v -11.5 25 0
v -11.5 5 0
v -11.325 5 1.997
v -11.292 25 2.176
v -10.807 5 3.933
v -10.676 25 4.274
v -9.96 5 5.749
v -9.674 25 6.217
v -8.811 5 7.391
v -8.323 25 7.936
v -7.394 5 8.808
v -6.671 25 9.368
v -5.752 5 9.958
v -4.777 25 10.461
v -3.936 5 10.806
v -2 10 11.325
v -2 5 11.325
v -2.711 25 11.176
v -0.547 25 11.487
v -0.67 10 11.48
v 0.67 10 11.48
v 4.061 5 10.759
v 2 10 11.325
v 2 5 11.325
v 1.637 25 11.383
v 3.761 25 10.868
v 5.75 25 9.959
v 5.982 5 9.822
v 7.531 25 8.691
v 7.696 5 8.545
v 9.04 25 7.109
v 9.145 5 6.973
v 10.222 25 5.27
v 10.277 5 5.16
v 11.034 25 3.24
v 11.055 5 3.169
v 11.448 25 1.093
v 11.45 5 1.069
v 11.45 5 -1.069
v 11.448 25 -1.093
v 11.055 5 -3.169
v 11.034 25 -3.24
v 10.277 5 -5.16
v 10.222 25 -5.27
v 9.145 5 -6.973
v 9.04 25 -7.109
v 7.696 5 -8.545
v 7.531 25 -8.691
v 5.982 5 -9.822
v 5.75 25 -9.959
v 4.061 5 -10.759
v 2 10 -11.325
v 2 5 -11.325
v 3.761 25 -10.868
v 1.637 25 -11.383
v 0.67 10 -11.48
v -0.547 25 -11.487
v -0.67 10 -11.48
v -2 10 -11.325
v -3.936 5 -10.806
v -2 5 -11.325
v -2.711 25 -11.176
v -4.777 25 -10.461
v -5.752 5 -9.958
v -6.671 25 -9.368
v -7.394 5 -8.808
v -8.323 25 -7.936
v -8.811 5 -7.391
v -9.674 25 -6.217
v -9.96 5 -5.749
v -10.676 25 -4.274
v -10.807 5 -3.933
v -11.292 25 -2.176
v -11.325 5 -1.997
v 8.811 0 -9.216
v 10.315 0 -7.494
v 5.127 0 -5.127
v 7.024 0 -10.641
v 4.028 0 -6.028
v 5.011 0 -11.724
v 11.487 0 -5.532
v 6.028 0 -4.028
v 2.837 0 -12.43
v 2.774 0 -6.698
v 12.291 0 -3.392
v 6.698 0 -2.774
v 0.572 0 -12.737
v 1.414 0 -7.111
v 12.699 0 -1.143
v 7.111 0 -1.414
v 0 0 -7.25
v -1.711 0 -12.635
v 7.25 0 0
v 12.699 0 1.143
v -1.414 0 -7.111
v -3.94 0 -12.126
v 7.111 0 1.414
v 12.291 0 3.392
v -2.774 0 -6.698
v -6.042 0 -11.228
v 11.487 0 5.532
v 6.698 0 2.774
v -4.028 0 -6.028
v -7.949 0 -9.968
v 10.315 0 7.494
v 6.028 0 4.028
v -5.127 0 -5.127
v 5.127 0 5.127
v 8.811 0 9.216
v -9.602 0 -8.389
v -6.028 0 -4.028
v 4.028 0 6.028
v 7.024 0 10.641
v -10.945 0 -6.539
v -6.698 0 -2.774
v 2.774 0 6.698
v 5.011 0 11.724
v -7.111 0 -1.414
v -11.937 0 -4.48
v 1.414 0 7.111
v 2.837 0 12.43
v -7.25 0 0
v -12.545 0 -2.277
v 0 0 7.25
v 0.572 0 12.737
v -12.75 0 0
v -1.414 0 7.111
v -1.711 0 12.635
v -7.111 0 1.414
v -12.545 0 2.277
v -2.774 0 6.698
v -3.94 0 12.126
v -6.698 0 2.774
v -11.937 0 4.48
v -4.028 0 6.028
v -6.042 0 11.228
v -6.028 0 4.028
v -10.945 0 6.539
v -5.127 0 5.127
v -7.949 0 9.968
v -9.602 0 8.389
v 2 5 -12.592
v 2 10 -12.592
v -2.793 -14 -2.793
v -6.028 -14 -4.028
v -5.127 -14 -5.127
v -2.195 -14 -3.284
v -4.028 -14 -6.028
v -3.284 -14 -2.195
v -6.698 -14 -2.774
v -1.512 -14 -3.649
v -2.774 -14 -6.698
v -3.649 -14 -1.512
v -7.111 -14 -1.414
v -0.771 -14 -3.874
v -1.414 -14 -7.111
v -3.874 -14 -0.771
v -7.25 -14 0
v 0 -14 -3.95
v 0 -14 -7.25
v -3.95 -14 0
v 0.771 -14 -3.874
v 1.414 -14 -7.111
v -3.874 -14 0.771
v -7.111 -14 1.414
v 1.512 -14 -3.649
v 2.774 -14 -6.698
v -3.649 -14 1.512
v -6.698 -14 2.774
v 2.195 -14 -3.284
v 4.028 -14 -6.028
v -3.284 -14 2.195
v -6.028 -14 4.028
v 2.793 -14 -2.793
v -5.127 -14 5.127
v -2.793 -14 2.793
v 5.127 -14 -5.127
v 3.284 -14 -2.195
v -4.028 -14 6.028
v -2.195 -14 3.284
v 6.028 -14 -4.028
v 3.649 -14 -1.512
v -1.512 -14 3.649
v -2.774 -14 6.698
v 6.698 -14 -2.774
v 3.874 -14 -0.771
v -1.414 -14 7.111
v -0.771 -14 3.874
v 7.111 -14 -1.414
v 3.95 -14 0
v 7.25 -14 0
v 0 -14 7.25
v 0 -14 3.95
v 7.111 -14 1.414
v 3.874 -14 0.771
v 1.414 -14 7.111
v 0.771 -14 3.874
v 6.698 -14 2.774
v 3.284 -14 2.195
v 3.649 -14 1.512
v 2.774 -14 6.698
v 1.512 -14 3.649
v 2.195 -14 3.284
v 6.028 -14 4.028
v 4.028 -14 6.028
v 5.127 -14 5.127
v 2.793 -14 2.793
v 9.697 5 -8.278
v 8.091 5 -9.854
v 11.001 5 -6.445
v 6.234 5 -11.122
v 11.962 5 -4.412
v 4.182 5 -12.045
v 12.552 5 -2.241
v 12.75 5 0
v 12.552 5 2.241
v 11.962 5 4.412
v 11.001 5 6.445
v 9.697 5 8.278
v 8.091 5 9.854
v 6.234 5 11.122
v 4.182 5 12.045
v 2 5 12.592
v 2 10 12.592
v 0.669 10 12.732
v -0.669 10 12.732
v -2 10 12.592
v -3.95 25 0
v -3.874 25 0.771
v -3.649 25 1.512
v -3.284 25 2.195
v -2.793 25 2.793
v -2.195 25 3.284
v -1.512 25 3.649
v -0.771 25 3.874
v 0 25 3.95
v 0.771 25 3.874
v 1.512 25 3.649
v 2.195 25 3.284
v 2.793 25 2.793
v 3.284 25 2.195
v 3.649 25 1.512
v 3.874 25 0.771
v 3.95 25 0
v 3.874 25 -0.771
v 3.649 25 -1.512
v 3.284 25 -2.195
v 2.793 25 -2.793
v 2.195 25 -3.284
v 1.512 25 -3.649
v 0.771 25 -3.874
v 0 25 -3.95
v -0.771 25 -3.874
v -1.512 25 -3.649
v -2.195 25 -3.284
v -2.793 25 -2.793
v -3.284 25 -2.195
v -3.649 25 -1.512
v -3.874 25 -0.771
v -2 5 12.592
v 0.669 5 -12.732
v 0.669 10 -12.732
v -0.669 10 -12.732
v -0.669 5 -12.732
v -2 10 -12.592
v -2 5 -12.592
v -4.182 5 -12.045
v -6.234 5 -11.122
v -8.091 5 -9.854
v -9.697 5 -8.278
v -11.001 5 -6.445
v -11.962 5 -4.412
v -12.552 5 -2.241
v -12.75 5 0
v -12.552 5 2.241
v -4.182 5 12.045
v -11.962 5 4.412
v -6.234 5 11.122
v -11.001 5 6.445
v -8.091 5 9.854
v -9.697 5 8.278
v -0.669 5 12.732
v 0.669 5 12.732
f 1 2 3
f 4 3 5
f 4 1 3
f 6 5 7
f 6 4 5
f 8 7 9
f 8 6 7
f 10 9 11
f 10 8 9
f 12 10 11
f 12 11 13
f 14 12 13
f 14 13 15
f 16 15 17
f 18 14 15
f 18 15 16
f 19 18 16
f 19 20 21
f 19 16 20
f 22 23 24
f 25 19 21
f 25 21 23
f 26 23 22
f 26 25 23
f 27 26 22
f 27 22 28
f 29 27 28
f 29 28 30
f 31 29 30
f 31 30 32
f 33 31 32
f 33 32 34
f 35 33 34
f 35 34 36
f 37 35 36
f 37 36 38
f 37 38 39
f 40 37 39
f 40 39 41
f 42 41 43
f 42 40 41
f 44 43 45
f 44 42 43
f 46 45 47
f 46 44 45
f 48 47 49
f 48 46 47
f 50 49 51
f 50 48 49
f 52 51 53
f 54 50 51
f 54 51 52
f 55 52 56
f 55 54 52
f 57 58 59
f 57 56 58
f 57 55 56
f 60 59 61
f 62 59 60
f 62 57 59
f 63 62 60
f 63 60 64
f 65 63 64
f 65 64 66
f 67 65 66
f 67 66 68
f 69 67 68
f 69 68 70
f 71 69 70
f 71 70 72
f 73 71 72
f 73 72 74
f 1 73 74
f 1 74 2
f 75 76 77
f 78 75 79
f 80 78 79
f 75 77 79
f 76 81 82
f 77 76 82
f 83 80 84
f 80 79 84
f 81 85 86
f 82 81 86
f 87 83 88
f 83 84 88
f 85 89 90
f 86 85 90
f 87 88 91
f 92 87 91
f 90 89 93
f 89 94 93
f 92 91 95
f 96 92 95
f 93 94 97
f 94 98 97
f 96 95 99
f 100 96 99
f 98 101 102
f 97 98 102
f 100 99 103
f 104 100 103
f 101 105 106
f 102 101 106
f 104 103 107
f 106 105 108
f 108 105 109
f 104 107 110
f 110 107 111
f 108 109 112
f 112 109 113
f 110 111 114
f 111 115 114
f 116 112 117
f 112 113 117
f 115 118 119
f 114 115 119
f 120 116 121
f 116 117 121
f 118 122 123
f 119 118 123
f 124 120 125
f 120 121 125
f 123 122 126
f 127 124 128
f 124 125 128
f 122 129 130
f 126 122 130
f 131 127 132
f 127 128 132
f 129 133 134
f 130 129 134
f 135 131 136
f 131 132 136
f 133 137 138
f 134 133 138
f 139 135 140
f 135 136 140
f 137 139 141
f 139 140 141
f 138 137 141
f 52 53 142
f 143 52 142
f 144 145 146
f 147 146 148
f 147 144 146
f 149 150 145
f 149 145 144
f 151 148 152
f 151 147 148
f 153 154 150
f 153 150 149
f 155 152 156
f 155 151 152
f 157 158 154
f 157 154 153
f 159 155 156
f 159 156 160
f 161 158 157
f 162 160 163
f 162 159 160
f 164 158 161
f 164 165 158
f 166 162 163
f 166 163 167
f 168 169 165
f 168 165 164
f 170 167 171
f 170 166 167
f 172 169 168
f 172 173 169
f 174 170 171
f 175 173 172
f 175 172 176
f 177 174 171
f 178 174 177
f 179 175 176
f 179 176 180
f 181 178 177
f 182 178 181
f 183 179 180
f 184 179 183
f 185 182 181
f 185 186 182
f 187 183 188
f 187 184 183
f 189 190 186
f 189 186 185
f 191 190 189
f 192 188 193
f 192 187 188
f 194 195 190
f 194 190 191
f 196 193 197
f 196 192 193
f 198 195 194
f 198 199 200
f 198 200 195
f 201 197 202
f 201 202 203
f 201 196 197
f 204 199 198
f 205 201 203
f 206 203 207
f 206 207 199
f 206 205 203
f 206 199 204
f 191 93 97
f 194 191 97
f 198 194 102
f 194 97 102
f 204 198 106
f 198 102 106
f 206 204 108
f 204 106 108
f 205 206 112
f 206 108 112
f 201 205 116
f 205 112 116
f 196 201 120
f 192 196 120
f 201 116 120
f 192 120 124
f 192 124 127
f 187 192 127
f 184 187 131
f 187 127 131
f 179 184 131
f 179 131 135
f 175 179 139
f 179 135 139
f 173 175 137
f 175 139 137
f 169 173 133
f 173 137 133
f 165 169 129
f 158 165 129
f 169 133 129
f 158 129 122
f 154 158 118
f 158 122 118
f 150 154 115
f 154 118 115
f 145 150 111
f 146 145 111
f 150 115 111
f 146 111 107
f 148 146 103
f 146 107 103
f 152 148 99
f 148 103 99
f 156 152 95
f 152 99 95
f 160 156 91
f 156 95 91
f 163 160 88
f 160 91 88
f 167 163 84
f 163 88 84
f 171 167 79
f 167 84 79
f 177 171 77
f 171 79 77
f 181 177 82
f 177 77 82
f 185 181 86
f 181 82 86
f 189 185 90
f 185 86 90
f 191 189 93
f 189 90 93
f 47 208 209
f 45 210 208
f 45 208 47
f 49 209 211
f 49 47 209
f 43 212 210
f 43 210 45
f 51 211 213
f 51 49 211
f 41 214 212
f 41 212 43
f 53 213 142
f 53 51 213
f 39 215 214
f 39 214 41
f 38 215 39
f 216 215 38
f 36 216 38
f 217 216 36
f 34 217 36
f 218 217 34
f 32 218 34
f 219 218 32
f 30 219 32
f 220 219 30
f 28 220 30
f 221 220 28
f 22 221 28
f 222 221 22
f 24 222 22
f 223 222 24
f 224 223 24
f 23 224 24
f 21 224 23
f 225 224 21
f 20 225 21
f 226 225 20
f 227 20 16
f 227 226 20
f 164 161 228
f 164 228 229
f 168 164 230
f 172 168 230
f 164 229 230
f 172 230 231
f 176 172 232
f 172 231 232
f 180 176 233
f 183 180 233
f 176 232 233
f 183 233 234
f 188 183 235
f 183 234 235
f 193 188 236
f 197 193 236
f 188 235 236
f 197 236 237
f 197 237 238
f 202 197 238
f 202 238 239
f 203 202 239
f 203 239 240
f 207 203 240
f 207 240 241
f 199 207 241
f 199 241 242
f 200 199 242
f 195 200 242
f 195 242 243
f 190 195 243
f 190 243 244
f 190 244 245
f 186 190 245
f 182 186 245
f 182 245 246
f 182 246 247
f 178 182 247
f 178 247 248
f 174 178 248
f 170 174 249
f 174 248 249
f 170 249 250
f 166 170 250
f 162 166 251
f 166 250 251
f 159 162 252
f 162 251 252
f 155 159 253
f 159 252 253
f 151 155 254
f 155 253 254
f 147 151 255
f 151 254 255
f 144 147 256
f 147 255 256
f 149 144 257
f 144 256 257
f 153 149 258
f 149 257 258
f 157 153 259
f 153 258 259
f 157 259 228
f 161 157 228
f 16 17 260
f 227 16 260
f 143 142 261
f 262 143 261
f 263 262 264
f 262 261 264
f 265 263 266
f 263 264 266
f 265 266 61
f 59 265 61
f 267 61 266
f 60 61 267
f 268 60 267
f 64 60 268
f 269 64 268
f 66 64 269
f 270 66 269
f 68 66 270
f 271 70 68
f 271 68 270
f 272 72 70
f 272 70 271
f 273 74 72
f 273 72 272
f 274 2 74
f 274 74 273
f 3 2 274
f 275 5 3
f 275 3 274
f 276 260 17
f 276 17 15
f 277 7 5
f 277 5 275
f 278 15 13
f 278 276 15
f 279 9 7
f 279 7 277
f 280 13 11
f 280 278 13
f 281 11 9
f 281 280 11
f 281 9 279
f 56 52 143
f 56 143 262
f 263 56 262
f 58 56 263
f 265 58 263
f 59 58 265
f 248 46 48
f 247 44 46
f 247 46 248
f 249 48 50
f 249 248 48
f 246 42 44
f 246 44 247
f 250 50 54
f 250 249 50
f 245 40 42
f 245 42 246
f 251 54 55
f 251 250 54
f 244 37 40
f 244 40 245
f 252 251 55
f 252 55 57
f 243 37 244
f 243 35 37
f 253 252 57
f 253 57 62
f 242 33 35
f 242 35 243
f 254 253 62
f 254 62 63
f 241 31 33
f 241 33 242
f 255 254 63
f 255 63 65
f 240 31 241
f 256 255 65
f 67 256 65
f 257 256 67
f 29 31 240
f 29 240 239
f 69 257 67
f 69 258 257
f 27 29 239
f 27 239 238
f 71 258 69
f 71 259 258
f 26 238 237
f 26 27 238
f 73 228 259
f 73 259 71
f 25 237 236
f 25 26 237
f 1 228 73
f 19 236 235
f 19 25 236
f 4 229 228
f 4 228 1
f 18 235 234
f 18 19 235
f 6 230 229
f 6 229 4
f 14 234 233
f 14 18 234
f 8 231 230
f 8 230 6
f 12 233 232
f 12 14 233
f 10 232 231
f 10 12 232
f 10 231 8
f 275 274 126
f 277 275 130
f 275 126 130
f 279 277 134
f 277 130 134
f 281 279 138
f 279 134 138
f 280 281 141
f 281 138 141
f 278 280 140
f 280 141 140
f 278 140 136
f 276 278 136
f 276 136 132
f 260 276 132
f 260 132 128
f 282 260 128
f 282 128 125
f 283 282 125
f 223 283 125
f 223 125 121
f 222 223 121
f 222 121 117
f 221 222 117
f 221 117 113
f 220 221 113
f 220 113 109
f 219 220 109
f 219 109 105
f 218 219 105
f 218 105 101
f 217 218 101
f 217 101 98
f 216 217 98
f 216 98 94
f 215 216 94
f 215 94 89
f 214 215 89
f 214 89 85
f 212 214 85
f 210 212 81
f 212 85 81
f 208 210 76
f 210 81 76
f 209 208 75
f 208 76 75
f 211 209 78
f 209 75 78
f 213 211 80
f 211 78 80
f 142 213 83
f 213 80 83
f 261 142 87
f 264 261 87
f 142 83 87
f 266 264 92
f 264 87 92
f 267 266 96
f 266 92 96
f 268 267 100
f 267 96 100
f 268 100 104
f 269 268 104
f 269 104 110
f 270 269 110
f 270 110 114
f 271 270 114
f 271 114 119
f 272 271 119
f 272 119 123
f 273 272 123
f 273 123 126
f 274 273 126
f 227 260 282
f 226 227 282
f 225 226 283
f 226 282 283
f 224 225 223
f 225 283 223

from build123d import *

# Parameters (mm, degrees)
F0_R      = 7.25
F1_DEPTH  = 14
F3_R      = 3
F4_DEPTH  = 14.001
F6_R      = 12.75
F7_DEPTH  = 25
F8_R      = 3.95
F9_DEPTH  = 39.001
F10_R     = 12.75
F10_R_2   = 11.5
F11_DEPTH = 20
F13_DEPTH = 5


with BuildPart() as f1:
    # F0 (on Front) → F1 (new body)
    with BuildSketch(Plane.XZ):
        Circle(F0_R)
    extrude(amount=F1_DEPTH)

    # F3 (on face) → F4 (cut, through all)
    with BuildSketch(Plane.XZ.offset(14)):
        Circle(F3_R)
    extrude(amount=-F4_DEPTH, mode=Mode.SUBTRACT)

    # F6 (on offset) → F7 (join)
    with BuildSketch(Plane(origin=(0, 0, 0), x_dir=(-1, 0, 0), z_dir=(0, 1, 0))):
        Circle(F6_R)
    extrude(amount=F7_DEPTH)

    # F8 (on face) → F9 (cut, through all)
    with BuildSketch(Plane(origin=(0, 25, 0), x_dir=(-1, 0, 0), z_dir=(0, 1, 0))):
        Circle(F8_R)
    extrude(amount=-F9_DEPTH, mode=Mode.SUBTRACT)

    # F10 (on face) → F11 (cut)
    with BuildSketch(Plane(origin=(0, 25, 0), x_dir=(-1, 0, 0), z_dir=(0, 1, 0))):
        Circle(F10_R)
        Circle(F10_R_2, mode=Mode.SUBTRACT)
    extrude(amount=-F11_DEPTH, mode=Mode.SUBTRACT)

    # F12 (on face) → F13 (join)
    with BuildSketch(Plane(origin=(0, 5, 0), x_dir=(-1, 0, 0), z_dir=(0, 1, 0))):
        with BuildLine():
            ThreePointArc((2, 12.5921602595), (0, 12.75), (-2, 12.5921602595))
            Line((-2, 12.5921602595), (-2, 11.3247516529))
            ThreePointArc((-2, 11.3247516529), (0, 11.5), (2, 11.3247516529))
            Line((2, 11.3247516529), (2, 12.5921602595))
        make_face()
        with BuildLine():
            Line((-2, -11.3247516529), (-2, -12.5921602595))
            ThreePointArc((-2, -12.5921602595), (0, -12.75), (2, -12.5921602595))
            Line((2, -12.5921602595), (2, -11.3247516529))
            ThreePointArc((2, -11.3247516529), (0, -11.5), (-2, -11.3247516529))
        make_face()
    extrude(amount=F13_DEPTH)


solid = f1.part
